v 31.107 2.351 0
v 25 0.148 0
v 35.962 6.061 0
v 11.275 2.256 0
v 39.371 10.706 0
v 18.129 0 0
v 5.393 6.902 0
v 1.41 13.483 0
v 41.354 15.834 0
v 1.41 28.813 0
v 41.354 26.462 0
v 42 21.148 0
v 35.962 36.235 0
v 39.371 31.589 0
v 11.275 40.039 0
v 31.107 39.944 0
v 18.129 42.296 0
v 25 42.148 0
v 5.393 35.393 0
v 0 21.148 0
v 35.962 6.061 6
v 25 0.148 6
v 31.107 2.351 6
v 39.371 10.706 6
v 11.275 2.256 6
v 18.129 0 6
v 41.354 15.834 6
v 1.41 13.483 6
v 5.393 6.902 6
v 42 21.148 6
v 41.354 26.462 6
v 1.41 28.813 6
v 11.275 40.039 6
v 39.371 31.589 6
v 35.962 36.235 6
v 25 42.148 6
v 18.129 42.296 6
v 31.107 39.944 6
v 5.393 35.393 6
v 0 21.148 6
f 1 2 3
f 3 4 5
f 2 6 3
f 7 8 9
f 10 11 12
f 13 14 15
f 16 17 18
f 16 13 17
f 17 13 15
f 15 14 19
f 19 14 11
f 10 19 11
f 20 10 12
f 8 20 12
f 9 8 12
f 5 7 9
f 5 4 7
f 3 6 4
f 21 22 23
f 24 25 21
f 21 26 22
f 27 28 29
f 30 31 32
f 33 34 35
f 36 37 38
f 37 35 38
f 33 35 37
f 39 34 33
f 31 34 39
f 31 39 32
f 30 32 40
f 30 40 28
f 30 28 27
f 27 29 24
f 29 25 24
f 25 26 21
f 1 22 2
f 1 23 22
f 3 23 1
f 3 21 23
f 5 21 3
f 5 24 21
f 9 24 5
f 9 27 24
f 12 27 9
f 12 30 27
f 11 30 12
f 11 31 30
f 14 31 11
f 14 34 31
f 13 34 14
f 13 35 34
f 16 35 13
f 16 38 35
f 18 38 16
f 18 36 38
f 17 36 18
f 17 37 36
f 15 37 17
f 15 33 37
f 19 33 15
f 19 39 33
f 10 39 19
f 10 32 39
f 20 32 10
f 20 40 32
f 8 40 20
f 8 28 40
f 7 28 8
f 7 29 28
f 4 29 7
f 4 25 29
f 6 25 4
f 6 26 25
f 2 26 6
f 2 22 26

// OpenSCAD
$fn = 32;

// ----------------------------------------------------------------------
// Cam disc: base radius 17.0 mm, lift 8.0 mm, 20 profile points
// ----------------------------------------------------------------------

// --- parameters (mm) ---
profile_height = 6;       // extrusion height
profile_points = 20;      // points of the closed outline

profile = [[42, 21.148], [41.354, 26.462], [39.371, 31.589], [35.962, 36.235], [31.107, 39.944], [25, 42.148], [18.129, 42.296], [11.275, 40.039], [5.393, 35.393], [1.41, 28.813], [0, 21.148], [1.41, 13.483], [5.393, 6.902], [11.275, 2.256], [18.129, 0], [25, 0.148], [31.107, 2.351], [35.962, 6.061], [39.371, 10.706], [41.354, 15.834]];  // single closed polygon, 20 points, counter clockwise

// --- the one profile operation ---
linear_extrude(height = profile_height) polygon(points = profile);
